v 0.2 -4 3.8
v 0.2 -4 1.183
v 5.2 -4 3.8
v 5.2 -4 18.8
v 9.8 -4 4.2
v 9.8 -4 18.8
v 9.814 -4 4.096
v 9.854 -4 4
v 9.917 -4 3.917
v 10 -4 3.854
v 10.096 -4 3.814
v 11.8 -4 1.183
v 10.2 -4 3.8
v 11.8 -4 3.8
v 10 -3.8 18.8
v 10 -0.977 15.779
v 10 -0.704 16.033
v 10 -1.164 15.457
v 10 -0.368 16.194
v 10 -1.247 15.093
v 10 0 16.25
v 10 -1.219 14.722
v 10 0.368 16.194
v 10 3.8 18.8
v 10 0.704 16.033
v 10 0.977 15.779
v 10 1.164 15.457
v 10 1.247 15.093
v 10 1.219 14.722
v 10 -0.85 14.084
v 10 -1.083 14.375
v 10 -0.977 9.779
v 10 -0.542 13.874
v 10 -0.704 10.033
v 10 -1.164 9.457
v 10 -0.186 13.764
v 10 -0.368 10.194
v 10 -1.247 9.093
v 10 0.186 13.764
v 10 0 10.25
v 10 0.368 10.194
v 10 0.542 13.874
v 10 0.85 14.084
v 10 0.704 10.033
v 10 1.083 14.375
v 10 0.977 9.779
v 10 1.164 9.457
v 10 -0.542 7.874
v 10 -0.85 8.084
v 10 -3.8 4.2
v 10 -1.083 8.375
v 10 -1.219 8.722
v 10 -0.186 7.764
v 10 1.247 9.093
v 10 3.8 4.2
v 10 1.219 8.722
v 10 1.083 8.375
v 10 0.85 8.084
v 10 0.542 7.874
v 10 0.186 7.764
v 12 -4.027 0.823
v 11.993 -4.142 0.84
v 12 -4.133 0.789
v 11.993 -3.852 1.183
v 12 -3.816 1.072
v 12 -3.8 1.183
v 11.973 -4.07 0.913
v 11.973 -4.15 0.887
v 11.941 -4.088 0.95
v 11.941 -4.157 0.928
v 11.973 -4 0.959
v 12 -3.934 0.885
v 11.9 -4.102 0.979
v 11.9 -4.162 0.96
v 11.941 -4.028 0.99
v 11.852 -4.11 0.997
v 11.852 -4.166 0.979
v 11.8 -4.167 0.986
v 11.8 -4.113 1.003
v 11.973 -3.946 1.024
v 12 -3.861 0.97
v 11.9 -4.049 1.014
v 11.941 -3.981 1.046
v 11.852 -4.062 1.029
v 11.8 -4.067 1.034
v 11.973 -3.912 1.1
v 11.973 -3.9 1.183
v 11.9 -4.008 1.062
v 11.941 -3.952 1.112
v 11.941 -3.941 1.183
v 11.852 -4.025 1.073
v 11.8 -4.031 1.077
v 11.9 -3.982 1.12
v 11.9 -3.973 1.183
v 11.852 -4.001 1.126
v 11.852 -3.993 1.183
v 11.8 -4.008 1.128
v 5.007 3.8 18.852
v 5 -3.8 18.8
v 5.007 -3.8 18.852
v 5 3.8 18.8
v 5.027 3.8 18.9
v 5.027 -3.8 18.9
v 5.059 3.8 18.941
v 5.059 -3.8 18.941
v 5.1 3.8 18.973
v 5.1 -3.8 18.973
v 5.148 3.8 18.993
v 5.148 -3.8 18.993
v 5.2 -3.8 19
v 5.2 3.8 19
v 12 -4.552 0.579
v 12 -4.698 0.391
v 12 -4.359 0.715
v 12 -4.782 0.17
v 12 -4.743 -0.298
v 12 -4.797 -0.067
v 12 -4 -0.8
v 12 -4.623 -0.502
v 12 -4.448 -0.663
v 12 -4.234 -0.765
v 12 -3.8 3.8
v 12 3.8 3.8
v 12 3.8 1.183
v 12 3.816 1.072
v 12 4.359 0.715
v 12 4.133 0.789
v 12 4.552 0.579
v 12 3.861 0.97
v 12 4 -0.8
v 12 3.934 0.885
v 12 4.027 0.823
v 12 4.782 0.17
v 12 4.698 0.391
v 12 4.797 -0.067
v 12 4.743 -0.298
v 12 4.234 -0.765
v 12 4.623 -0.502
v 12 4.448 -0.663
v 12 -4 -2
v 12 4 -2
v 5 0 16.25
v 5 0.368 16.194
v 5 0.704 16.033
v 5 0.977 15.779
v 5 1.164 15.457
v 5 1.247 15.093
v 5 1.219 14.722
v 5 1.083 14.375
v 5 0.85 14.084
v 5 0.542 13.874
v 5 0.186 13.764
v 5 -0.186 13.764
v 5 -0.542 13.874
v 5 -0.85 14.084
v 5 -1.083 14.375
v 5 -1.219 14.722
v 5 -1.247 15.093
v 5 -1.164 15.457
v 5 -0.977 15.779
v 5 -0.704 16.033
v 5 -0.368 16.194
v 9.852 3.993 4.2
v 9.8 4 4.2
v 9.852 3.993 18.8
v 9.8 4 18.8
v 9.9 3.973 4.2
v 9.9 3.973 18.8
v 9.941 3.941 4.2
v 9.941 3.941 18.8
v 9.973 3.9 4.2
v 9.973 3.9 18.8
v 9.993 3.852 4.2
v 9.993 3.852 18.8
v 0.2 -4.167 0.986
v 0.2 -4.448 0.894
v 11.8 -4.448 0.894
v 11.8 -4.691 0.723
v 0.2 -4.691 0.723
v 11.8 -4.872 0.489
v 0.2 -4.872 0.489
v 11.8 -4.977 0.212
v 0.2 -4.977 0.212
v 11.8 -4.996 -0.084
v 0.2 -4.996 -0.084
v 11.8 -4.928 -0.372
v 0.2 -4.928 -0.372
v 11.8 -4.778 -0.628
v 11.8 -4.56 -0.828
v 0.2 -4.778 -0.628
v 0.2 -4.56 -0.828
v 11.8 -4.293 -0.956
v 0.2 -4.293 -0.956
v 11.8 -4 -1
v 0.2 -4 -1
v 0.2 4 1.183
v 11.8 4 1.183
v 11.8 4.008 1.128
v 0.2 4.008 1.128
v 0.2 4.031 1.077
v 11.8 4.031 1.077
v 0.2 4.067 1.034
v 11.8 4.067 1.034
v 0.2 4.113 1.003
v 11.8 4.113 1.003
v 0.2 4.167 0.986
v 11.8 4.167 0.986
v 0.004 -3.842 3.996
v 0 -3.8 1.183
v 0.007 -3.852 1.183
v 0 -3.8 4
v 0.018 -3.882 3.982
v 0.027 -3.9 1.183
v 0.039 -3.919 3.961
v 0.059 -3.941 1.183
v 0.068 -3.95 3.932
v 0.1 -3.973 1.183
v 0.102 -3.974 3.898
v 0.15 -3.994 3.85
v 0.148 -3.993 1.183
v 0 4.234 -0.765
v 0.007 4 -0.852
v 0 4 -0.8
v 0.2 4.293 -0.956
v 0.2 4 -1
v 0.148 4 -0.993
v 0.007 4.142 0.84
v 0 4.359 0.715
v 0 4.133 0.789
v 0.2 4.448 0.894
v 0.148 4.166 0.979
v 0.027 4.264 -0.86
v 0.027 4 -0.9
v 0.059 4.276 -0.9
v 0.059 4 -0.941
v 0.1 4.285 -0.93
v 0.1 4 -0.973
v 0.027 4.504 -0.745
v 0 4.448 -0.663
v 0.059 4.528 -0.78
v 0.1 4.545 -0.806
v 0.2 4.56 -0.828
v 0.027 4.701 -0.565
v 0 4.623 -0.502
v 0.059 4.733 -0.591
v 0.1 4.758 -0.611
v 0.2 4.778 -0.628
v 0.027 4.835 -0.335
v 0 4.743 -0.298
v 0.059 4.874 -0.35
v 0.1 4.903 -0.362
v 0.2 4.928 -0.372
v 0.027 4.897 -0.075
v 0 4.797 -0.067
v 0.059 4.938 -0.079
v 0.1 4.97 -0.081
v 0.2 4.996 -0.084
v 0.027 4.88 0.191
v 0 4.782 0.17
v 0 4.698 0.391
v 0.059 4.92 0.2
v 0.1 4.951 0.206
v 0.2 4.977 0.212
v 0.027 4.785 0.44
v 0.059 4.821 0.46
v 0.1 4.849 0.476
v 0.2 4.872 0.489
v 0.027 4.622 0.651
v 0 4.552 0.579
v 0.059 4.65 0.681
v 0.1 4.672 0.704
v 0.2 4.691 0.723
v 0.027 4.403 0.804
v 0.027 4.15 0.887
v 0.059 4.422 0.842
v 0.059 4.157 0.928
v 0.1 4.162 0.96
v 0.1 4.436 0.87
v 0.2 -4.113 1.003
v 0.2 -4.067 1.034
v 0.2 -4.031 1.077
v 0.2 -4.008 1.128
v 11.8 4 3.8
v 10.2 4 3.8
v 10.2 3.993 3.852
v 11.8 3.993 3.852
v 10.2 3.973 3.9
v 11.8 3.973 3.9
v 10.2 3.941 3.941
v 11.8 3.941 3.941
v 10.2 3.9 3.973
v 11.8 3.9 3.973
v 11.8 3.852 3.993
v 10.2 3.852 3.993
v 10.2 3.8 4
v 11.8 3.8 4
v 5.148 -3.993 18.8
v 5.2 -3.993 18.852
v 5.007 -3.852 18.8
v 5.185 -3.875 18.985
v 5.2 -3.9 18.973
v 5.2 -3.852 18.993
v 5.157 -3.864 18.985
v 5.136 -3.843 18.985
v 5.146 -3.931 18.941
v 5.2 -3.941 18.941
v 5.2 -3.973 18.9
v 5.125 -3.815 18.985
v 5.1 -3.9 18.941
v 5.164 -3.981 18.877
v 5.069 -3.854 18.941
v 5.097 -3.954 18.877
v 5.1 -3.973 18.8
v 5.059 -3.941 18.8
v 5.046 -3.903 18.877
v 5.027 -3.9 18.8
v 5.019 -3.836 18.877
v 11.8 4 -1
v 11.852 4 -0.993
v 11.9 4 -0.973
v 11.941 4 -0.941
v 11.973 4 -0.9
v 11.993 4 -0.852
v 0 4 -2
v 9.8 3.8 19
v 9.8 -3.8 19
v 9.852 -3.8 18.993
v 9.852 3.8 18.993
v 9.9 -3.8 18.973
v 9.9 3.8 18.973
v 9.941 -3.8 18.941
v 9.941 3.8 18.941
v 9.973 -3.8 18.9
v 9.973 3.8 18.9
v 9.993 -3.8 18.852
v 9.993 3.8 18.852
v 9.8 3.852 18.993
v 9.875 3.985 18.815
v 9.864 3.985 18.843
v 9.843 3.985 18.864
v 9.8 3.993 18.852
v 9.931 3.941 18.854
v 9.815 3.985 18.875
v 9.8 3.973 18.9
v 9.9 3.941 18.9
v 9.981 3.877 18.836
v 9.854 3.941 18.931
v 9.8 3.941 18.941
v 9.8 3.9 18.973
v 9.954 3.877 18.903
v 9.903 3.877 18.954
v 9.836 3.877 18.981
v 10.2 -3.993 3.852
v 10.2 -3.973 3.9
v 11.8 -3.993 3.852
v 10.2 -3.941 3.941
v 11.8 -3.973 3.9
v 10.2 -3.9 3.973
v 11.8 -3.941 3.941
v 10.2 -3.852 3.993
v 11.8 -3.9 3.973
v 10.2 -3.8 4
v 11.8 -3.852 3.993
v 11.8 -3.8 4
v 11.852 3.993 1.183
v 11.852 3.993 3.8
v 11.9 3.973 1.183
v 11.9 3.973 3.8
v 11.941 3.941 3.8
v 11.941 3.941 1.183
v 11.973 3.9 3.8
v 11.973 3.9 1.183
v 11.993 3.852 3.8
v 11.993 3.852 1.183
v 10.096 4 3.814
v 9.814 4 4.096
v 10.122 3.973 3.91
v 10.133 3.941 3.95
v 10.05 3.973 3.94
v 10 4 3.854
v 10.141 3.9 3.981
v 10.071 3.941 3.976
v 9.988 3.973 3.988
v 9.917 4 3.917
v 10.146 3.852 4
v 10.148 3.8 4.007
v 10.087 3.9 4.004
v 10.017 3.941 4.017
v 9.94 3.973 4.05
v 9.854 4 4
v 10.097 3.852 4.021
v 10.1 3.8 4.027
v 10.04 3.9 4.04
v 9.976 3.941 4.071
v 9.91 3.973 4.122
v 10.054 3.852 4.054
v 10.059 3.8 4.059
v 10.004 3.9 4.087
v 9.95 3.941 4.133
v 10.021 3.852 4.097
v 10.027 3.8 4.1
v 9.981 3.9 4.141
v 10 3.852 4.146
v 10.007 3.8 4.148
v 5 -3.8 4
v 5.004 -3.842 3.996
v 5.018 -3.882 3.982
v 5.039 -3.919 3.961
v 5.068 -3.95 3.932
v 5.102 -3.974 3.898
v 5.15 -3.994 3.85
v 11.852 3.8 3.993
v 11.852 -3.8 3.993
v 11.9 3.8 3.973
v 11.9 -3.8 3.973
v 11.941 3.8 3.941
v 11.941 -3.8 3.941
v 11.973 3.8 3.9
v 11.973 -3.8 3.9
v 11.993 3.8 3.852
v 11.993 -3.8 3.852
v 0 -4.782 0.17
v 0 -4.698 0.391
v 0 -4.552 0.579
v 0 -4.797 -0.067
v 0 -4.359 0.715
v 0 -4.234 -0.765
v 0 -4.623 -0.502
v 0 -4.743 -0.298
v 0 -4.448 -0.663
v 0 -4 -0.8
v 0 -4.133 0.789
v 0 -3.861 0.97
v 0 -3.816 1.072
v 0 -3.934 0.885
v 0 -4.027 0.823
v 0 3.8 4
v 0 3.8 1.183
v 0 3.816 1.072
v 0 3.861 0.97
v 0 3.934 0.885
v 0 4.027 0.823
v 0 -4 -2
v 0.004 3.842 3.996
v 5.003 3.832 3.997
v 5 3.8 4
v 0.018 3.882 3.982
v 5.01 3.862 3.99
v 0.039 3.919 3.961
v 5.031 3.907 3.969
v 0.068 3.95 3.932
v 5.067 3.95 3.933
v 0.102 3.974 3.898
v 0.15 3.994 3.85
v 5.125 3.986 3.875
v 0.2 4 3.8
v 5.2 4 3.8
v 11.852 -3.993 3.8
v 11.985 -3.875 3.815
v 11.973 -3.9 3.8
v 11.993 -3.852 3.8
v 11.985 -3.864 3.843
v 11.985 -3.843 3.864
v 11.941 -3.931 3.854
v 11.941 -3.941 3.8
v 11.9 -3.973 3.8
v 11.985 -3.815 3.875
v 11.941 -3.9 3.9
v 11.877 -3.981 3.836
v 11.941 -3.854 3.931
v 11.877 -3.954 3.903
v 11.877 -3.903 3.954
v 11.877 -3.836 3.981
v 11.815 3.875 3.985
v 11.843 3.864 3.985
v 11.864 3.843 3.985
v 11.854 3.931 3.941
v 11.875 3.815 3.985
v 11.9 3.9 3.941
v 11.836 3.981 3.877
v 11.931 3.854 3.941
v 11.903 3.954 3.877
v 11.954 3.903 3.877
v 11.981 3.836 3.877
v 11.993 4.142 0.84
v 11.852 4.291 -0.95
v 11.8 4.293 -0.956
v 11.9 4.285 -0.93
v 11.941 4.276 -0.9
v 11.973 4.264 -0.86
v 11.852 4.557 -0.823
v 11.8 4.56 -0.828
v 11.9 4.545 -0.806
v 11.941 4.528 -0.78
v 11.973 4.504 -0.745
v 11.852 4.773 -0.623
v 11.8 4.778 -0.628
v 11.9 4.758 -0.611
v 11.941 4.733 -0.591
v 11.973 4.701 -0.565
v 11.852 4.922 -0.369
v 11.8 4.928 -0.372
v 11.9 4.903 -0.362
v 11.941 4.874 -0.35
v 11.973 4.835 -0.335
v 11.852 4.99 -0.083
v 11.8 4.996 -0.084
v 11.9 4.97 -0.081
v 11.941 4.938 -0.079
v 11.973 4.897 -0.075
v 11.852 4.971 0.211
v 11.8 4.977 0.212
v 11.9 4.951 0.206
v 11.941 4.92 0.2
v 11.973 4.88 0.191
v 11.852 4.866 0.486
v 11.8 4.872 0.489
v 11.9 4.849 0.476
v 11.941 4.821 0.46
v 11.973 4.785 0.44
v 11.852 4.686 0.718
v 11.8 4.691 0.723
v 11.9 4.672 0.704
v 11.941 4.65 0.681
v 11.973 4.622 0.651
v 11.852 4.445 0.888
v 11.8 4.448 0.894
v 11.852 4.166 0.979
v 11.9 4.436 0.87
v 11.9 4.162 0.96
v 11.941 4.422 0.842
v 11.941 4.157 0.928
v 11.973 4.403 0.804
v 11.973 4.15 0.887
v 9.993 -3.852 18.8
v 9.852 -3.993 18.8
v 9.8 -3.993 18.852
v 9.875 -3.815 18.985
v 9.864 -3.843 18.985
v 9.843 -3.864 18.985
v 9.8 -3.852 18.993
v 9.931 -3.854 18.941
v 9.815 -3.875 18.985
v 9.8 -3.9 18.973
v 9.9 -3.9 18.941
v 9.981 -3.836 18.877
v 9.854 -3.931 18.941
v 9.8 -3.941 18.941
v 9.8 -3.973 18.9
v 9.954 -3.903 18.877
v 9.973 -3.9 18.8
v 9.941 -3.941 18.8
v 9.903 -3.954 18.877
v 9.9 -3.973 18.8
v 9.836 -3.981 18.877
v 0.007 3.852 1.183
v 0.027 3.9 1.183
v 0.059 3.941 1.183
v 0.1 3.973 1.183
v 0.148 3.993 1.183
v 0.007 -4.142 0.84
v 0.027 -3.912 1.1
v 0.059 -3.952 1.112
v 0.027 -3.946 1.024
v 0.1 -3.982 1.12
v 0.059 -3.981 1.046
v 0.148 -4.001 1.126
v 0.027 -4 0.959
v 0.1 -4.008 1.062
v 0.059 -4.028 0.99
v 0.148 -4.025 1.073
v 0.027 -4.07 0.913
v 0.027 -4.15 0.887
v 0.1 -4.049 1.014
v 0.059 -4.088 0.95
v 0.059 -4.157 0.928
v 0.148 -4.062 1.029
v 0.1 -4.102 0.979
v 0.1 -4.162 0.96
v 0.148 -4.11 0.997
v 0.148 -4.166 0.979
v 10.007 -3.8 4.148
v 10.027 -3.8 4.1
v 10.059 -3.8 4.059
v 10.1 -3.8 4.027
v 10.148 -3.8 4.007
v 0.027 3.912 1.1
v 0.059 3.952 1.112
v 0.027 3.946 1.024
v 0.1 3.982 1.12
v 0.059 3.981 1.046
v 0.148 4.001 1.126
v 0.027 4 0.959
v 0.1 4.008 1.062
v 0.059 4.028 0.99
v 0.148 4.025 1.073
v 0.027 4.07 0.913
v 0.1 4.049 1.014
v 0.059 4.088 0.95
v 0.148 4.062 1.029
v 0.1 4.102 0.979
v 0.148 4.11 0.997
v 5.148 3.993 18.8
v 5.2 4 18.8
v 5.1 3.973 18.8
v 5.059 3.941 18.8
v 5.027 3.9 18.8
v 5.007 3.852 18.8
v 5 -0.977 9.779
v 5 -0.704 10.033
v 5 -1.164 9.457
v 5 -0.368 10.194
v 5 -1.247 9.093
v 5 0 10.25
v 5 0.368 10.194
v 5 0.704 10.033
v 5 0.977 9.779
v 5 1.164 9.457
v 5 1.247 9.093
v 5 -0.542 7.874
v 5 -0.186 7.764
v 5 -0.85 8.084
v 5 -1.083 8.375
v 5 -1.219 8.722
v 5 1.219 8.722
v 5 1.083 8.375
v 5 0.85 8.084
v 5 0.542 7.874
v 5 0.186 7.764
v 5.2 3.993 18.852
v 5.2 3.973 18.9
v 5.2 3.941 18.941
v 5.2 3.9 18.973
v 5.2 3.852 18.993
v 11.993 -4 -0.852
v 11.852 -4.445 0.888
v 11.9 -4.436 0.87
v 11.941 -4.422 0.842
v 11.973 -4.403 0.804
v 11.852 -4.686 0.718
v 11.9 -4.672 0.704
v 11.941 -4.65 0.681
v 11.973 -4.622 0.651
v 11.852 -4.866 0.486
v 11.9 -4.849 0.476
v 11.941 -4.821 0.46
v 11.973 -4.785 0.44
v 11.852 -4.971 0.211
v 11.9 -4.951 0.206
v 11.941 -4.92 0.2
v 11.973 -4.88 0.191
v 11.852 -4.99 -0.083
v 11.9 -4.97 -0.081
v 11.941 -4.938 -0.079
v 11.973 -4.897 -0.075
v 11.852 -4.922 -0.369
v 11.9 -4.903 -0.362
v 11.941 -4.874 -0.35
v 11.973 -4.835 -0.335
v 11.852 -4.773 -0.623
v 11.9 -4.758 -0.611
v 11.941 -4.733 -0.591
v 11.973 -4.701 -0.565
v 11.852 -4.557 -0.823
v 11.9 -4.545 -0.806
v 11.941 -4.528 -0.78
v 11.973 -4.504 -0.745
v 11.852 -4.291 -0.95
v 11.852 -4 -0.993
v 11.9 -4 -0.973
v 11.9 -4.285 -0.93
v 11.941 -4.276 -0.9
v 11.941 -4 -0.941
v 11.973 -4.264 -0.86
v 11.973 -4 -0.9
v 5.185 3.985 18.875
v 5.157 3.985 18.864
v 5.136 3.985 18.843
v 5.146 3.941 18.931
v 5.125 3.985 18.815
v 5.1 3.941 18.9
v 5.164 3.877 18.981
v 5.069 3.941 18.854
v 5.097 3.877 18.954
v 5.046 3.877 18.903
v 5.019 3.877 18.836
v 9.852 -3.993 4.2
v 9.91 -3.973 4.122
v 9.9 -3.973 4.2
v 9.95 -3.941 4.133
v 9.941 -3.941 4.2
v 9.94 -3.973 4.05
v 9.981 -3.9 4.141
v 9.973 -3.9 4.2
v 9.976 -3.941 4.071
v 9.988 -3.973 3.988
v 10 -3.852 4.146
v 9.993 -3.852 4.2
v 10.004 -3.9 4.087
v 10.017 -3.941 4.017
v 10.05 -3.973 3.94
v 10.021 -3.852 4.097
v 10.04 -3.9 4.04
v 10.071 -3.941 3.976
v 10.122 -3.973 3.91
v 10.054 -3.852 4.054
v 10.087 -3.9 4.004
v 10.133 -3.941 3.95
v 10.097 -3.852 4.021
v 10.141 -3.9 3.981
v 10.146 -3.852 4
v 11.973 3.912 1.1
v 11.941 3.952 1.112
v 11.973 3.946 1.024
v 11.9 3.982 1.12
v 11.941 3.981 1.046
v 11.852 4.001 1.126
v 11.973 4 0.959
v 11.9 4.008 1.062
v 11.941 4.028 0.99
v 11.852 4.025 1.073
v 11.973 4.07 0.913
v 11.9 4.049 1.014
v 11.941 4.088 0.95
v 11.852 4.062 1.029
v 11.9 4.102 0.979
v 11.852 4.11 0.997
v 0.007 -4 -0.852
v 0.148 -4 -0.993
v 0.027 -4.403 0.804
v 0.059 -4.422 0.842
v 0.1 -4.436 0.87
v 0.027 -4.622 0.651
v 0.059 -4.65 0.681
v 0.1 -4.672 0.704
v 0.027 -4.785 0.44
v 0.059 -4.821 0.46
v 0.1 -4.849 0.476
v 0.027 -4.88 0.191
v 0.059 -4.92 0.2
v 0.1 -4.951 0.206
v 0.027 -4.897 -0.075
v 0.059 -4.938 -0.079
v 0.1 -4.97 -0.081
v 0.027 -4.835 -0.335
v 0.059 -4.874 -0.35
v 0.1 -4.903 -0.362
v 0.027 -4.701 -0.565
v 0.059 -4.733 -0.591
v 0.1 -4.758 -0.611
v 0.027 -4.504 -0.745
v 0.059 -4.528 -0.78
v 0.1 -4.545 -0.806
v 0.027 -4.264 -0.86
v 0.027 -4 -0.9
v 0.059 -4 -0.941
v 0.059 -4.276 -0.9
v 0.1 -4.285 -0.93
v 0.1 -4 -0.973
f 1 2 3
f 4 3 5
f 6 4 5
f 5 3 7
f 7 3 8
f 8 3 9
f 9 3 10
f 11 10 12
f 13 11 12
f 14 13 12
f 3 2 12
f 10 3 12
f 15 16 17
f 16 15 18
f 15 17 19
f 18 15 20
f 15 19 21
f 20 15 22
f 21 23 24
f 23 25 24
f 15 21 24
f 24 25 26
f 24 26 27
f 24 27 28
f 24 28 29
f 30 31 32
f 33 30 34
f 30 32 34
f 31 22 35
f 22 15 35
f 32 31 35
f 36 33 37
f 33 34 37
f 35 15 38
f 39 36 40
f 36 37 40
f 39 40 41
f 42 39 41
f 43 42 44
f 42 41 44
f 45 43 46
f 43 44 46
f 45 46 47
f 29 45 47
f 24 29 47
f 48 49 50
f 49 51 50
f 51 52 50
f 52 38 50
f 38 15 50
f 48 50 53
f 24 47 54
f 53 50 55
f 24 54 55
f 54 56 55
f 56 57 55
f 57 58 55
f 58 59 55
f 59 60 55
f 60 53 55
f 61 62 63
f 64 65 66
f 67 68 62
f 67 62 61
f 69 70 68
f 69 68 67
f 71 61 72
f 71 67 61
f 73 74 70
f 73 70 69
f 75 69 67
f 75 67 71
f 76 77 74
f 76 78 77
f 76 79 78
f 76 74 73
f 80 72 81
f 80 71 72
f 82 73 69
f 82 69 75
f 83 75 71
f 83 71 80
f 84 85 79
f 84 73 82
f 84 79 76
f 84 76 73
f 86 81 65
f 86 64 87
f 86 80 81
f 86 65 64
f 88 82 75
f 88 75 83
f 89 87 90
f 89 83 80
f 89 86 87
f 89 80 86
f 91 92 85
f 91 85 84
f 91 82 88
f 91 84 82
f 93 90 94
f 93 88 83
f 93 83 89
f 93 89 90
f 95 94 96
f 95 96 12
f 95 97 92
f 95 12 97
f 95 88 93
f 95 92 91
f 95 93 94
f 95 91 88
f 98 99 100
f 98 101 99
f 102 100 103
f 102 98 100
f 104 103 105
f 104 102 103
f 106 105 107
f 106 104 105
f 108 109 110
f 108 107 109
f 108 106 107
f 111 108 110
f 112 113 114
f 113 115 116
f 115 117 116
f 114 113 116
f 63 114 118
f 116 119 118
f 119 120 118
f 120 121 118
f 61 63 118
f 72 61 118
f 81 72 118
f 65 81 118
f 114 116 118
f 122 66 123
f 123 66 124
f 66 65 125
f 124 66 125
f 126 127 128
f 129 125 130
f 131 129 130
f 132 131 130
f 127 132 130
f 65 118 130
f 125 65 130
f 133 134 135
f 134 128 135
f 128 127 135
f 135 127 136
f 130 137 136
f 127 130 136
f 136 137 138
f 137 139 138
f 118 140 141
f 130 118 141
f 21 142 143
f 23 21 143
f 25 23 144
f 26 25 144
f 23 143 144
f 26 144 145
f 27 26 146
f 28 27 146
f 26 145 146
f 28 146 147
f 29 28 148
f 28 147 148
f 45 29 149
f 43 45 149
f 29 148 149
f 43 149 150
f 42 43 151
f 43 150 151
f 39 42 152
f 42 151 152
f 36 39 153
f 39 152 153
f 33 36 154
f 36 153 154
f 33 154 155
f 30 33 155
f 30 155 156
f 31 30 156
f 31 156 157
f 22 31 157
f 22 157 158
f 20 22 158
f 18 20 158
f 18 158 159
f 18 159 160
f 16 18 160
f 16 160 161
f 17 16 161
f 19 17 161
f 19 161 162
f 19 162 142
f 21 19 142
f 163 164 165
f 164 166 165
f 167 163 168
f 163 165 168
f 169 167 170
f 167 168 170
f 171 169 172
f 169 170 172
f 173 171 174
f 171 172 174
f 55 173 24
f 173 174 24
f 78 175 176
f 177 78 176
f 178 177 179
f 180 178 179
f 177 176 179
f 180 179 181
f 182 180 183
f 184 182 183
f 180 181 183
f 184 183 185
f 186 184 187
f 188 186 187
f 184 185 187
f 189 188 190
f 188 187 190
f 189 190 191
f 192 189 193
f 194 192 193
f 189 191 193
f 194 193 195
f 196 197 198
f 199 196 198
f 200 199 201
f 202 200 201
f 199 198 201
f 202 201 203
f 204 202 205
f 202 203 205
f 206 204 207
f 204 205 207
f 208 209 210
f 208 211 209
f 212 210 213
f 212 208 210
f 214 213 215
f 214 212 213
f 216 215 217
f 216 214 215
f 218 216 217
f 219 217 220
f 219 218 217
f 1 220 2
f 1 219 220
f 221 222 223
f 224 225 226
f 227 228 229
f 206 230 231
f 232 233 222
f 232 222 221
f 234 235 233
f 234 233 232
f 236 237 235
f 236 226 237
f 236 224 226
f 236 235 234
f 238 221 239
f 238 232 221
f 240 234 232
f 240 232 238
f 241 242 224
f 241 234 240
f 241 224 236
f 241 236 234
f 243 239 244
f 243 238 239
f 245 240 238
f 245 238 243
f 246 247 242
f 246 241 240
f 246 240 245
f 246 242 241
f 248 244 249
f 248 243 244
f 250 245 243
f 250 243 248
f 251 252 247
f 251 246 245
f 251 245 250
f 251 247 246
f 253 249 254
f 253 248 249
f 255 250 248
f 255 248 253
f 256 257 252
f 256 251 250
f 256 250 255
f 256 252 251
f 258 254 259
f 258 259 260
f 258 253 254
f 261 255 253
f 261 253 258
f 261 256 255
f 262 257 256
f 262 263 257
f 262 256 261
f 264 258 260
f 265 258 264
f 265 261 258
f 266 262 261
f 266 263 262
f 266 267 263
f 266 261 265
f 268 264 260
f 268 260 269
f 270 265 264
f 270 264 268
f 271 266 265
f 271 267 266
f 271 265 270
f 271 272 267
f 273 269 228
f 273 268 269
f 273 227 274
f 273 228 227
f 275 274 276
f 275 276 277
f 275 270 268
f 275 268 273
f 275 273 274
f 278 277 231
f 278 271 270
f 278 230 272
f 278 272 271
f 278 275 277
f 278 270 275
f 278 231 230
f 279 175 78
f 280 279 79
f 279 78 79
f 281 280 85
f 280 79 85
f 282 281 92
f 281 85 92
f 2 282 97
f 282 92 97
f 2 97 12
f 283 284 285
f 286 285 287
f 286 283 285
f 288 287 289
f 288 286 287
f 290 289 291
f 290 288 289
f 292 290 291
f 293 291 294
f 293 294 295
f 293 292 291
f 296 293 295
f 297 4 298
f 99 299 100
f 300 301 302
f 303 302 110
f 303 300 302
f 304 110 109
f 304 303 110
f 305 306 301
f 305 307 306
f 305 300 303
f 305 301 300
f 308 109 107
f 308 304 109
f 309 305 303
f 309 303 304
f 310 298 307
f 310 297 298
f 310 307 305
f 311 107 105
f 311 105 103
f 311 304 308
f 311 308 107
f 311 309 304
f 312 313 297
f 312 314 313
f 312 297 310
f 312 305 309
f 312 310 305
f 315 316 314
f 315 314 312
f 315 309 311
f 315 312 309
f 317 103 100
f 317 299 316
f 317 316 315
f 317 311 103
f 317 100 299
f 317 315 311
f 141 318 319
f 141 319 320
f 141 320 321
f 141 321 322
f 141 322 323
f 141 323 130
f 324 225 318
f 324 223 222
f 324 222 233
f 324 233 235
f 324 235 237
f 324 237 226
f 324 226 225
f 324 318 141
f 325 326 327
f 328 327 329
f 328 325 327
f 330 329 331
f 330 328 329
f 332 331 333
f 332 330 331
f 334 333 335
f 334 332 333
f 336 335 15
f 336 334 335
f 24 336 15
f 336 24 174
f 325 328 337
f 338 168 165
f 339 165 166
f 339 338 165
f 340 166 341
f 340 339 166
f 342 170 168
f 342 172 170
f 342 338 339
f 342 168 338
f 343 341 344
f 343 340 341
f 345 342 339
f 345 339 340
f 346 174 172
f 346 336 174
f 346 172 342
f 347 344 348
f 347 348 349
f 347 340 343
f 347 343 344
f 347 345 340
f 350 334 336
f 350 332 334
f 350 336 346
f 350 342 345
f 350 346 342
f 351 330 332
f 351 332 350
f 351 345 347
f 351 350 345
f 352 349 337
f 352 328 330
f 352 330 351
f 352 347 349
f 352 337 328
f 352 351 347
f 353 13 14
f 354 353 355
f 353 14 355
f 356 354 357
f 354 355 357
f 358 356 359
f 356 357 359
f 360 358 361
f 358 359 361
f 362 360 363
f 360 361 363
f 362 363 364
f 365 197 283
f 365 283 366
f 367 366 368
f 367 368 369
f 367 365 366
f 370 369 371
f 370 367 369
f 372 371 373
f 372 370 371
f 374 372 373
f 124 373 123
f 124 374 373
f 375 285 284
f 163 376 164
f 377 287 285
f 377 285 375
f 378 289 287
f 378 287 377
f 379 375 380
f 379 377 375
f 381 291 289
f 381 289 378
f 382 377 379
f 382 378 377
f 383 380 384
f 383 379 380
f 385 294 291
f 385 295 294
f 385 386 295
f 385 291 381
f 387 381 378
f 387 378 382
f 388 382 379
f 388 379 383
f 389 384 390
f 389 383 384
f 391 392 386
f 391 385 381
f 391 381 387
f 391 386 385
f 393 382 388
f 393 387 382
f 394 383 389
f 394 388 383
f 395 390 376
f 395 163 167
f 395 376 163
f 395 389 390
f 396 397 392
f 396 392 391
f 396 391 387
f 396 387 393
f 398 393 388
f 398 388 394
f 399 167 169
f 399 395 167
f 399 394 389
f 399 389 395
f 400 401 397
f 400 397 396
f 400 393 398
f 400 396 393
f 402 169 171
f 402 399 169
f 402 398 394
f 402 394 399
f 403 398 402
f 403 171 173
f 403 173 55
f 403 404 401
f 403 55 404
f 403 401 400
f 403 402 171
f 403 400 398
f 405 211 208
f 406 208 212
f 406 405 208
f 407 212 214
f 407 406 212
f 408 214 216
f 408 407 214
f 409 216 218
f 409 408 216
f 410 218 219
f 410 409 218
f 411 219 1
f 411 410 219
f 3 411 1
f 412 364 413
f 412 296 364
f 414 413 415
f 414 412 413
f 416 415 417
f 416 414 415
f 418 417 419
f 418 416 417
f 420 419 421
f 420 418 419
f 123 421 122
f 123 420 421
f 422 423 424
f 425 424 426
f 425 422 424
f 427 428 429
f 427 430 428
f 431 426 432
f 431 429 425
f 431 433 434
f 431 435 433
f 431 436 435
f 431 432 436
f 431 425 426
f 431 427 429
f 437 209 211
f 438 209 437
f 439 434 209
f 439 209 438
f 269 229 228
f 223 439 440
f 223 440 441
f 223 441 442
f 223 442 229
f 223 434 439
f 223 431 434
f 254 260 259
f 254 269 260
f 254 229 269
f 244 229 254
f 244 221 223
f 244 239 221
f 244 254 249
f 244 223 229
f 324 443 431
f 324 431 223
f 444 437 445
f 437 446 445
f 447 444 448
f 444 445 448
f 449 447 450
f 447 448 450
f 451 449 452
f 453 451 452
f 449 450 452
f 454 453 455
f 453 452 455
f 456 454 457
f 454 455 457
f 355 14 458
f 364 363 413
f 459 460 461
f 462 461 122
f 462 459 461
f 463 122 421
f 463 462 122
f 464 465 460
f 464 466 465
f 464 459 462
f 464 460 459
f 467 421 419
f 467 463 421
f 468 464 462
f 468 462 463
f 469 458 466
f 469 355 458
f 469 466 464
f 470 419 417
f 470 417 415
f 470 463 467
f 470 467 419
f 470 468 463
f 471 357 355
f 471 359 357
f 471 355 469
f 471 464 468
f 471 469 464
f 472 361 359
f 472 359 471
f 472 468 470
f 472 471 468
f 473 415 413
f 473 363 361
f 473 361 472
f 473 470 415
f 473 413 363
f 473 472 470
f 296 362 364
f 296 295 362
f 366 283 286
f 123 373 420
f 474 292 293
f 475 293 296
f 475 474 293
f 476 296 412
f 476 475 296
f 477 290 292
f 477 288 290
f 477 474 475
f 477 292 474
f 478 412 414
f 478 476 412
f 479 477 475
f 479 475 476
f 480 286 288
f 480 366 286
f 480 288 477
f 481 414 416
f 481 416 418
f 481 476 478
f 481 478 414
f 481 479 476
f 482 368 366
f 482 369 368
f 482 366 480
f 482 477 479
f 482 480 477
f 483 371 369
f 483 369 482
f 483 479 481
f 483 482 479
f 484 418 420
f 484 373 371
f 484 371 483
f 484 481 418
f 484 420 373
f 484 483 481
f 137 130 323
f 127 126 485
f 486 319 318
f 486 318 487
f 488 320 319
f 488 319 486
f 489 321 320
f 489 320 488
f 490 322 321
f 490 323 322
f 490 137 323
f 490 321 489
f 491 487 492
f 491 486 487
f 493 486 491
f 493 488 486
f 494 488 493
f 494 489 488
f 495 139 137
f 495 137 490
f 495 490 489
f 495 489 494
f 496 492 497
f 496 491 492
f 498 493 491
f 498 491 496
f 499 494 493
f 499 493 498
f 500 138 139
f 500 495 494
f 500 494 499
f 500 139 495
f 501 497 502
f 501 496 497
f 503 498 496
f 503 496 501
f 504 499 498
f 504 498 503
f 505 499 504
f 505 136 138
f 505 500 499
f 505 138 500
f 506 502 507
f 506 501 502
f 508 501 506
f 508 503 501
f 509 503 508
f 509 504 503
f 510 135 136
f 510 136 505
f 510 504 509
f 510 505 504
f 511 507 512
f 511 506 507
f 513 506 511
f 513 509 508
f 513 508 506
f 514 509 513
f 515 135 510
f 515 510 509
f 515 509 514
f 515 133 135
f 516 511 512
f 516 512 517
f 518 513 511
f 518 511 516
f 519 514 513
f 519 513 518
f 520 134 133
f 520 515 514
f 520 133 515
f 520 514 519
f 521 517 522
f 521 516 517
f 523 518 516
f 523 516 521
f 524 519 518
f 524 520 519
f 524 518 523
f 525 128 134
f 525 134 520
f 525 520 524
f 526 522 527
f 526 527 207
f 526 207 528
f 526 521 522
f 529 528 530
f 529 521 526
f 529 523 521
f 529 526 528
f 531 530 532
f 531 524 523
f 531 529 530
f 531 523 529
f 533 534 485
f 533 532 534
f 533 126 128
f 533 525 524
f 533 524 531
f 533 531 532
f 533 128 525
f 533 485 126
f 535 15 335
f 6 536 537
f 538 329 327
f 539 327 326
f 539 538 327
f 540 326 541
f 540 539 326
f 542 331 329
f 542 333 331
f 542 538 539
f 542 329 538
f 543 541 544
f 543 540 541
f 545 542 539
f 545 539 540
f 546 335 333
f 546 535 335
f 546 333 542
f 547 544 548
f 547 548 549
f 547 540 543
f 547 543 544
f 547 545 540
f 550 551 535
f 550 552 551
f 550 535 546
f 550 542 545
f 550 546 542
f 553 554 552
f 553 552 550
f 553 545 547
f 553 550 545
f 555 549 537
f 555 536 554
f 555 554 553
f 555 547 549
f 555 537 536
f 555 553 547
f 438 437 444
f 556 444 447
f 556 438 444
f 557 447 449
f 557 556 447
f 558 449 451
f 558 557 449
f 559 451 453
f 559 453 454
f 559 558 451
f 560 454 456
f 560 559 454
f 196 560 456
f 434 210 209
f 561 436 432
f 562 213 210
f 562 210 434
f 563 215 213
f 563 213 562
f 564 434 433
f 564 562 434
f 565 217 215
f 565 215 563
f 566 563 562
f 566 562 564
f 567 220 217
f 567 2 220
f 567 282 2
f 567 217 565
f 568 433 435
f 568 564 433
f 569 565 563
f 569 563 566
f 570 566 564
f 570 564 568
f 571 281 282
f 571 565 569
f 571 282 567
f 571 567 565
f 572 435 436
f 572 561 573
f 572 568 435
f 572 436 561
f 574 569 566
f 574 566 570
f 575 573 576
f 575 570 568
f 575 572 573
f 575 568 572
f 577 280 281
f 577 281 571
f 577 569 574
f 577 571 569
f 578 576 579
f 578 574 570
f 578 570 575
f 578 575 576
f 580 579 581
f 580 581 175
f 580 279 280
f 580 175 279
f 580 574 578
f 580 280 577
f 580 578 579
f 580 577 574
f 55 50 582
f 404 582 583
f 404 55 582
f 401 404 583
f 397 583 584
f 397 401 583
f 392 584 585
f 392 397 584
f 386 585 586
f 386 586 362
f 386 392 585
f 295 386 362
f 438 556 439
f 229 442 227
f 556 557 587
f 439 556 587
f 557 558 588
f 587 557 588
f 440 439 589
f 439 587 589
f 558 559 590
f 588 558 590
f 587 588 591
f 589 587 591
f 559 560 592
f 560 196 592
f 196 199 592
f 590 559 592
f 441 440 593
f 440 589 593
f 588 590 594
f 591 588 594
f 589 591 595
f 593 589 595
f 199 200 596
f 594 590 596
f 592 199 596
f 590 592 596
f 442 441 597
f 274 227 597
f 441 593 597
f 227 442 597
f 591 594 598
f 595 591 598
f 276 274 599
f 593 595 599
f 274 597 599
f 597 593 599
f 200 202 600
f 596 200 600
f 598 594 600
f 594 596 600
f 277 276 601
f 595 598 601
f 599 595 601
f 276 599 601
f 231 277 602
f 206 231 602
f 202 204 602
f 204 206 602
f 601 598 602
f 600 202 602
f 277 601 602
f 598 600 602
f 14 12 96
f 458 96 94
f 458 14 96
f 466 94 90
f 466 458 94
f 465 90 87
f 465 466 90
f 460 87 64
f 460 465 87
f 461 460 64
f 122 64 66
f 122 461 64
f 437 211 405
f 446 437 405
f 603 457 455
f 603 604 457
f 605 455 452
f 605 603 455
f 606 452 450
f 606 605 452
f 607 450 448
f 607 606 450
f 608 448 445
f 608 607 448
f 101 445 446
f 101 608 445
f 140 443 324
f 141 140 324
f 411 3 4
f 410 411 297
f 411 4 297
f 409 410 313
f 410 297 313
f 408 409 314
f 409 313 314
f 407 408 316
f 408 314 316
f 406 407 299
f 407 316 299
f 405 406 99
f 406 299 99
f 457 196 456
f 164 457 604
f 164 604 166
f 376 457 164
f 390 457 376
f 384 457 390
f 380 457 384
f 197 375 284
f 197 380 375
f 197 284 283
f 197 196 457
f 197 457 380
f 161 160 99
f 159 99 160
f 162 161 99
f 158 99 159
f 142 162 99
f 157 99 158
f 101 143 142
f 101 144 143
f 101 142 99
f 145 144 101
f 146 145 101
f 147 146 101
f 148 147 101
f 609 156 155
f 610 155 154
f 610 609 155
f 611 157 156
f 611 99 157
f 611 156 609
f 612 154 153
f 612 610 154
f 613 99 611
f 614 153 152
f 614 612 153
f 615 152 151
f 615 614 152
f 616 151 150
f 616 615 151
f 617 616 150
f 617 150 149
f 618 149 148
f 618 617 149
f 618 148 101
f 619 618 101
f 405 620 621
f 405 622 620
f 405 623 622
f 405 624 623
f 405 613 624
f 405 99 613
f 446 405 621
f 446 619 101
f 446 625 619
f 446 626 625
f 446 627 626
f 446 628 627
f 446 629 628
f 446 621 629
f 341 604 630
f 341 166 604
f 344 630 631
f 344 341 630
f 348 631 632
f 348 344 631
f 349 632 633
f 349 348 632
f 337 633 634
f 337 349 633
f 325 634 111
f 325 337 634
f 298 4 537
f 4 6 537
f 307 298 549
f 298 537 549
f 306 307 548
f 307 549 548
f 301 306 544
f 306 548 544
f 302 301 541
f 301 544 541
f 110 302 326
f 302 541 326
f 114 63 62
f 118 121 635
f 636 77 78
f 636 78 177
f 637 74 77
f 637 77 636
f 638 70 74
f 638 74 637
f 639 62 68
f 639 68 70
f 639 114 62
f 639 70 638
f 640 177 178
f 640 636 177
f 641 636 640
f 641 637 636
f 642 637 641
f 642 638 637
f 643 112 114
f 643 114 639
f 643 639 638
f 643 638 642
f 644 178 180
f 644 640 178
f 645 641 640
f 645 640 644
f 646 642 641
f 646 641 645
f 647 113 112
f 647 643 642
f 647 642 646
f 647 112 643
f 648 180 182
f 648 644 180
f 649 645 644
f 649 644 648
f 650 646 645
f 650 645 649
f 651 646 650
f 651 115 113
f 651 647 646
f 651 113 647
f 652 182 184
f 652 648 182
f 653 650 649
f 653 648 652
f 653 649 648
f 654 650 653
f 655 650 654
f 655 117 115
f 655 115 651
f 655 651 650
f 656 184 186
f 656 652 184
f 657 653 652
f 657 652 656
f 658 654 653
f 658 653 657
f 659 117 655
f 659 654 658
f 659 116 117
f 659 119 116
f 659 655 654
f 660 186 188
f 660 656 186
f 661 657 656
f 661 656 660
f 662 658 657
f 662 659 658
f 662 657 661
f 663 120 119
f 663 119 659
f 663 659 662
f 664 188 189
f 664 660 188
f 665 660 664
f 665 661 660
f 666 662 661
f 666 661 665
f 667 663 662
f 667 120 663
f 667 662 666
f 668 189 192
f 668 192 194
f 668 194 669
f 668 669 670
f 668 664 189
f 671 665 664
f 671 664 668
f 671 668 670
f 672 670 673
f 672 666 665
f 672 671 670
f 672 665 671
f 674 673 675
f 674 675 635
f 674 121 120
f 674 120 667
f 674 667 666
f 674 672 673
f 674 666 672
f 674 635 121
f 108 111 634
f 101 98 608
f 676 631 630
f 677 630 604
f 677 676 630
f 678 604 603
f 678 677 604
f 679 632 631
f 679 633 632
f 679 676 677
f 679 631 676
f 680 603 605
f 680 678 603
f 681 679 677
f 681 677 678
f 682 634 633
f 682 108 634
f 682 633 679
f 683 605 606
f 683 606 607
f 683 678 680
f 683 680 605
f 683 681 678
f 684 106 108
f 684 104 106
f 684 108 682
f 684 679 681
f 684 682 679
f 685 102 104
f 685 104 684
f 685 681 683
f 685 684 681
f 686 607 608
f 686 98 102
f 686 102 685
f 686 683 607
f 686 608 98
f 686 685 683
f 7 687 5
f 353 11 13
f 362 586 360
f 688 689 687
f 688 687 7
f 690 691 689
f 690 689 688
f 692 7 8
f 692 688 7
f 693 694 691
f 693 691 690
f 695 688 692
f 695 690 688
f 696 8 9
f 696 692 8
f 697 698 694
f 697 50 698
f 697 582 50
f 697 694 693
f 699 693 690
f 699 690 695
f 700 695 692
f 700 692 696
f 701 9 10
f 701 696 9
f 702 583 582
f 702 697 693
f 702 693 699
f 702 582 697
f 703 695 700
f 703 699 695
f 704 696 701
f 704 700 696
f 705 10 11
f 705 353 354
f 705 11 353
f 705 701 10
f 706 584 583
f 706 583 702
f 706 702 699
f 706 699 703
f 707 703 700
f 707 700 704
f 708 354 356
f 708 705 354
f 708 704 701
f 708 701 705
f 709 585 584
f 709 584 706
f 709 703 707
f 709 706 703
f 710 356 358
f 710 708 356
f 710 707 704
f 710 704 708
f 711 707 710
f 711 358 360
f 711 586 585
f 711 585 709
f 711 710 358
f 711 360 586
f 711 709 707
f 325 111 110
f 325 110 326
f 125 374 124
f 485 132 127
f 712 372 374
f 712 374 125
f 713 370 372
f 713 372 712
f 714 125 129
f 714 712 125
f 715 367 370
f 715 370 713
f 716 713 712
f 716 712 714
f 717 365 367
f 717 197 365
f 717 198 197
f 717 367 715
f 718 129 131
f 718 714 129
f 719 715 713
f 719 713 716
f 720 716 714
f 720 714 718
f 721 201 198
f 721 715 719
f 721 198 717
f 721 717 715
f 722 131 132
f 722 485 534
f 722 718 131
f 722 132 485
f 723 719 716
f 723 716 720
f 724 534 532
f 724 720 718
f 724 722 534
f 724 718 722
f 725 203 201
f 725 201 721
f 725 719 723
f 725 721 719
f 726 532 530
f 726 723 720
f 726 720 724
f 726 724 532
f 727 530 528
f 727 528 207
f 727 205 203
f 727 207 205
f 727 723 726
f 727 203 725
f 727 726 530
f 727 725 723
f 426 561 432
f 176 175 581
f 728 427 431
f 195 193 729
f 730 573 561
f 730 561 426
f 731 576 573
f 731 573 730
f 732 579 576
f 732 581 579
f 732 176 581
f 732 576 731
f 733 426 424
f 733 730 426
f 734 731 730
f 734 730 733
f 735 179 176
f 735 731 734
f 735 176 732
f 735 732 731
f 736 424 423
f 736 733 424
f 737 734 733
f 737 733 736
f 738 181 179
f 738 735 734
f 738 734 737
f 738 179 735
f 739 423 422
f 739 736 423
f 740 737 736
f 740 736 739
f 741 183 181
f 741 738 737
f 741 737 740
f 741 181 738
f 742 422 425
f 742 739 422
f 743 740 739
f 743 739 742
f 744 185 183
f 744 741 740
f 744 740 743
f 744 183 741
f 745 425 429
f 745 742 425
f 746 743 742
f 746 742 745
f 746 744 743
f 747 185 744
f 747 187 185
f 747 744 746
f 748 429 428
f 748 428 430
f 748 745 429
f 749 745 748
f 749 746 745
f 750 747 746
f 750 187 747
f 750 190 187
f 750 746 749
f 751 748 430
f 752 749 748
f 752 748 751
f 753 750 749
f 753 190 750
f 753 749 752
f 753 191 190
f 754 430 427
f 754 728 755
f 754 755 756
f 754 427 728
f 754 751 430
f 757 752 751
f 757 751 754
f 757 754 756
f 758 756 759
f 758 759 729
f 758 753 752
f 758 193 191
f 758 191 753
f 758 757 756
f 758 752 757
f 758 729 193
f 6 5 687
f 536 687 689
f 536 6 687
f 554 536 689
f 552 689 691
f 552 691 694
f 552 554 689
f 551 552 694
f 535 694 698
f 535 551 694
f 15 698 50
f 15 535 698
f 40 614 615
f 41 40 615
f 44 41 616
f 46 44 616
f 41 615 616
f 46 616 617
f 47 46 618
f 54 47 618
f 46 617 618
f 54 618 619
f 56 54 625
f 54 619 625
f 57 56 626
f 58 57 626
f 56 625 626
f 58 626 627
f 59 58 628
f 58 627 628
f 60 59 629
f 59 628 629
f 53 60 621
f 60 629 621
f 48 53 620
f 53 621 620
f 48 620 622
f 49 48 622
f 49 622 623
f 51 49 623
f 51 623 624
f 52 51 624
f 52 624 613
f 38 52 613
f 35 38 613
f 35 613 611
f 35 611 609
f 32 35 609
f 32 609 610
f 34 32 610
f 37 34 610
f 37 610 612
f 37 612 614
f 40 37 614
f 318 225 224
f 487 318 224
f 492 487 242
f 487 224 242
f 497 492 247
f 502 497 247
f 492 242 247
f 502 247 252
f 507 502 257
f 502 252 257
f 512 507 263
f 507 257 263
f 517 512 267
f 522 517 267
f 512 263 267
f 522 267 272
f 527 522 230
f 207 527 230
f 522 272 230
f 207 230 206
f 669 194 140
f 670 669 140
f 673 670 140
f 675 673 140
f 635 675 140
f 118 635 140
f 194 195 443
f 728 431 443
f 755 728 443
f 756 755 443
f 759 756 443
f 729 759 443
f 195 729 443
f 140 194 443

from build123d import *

# Parameters (mm, degrees)
SKETCH1_R               = 1
SKETCH1_W               = 4
SKETCH1_H               = 8
BOSS_EXTRUDE1_DEPTH     = 12
SKETCH2_W               = 12
SKETCH2_H               = 8
BOSS_EXTRUDE2_DEPTH     = 2
SKETCH3_W               = 5
SKETCH3_H               = 8
BOSS_EXTRUDE3_DEPTH     = 15
SKETCH4_R               = 1.25
CUT_EXTRUDE1_DEPTH      = 6
CUT_EXTRUDE1_DEPTH_BACK = 8
FILLET1_R               = 0.2


with BuildPart() as part:
    # Sketch1 → Boss-Extrude1 (new body)
    with BuildSketch(Plane(origin=(0, 0, 0), x_dir=(0, 0, -1), z_dir=(1, 0, 0))):
        with Locations((0, -4)):
            Circle(SKETCH1_R)
        with Locations((0, 4)):
            Circle(SKETCH1_R)
        Rectangle(SKETCH1_W, SKETCH1_H)
        with BuildLine():
            ThreePointArc((-1, -4), (0, -5), (1, -4))
            Line((1, -4), (-1, -4))
        make_face()
        with BuildLine():
            Line((-1, -4), (1, -4))
            ThreePointArc((1, -4), (0, -3), (-1, -4))
        make_face()
    extrude(amount=BOSS_EXTRUDE1_DEPTH)

    # Sketch2 → Boss-Extrude2 (add)
    with BuildSketch(Plane.XY.offset(2)):
        with Locations((6, 0)):
            Rectangle(SKETCH2_W, SKETCH2_H)
    extrude(amount=BOSS_EXTRUDE2_DEPTH)

    # Sketch3 → Boss-Extrude3 (add)
    with BuildSketch(Plane.XY.offset(4)):
        with Locations((7.5, 0)):
            Rectangle(SKETCH3_W, SKETCH3_H)
    extrude(amount=BOSS_EXTRUDE3_DEPTH)

    # Sketch4 → Cut-Extrude1 (cut, two sides)
    with BuildSketch(Plane.ZY.offset(-5)) as cut_extrude1_sk:
        with Locations((15, 0)):
            Circle(SKETCH4_R)
        with Locations((9, 0)):
            Circle(SKETCH4_R)
    extrude(amount=CUT_EXTRUDE1_DEPTH, mode=Mode.SUBTRACT)
    extrude(cut_extrude1_sk.sketch, amount=-CUT_EXTRUDE1_DEPTH_BACK, mode=Mode.SUBTRACT)

    # Fillet1
    fillet1_edges = [part.edges().sort_by_distance(p)[0] for p in [
        (12, -5, 0),
        (0, -5, 0),
        (12, 5, 0),
        (0, 5, 0),
        (2.5, -4, 4),
        (5, -4, 11.5),
        (10, -4, 11.5),
        (11, -4, 4),
        (12, -4, 2.5),
        (6, -4, 1),
        (0, -4, 2.5),
        (10, 0, 19),
        (7.5, -4, 19),
        (5, 0, 19),
        (6, 4, 1),
        (12, 4, 2.5),
        (11, 4, 4),
        (10, 4, 11.5),
        (7.5, 4, 19),
        (5, 4, 11.5),
        (2.5, 4, 4),
        (0, 4, 2.5),
        (12, 0, 4),
        (10, 0, 4),
    ]]
    fillet(fillet1_edges, radius=FILLET1_R)


solid = part.part
